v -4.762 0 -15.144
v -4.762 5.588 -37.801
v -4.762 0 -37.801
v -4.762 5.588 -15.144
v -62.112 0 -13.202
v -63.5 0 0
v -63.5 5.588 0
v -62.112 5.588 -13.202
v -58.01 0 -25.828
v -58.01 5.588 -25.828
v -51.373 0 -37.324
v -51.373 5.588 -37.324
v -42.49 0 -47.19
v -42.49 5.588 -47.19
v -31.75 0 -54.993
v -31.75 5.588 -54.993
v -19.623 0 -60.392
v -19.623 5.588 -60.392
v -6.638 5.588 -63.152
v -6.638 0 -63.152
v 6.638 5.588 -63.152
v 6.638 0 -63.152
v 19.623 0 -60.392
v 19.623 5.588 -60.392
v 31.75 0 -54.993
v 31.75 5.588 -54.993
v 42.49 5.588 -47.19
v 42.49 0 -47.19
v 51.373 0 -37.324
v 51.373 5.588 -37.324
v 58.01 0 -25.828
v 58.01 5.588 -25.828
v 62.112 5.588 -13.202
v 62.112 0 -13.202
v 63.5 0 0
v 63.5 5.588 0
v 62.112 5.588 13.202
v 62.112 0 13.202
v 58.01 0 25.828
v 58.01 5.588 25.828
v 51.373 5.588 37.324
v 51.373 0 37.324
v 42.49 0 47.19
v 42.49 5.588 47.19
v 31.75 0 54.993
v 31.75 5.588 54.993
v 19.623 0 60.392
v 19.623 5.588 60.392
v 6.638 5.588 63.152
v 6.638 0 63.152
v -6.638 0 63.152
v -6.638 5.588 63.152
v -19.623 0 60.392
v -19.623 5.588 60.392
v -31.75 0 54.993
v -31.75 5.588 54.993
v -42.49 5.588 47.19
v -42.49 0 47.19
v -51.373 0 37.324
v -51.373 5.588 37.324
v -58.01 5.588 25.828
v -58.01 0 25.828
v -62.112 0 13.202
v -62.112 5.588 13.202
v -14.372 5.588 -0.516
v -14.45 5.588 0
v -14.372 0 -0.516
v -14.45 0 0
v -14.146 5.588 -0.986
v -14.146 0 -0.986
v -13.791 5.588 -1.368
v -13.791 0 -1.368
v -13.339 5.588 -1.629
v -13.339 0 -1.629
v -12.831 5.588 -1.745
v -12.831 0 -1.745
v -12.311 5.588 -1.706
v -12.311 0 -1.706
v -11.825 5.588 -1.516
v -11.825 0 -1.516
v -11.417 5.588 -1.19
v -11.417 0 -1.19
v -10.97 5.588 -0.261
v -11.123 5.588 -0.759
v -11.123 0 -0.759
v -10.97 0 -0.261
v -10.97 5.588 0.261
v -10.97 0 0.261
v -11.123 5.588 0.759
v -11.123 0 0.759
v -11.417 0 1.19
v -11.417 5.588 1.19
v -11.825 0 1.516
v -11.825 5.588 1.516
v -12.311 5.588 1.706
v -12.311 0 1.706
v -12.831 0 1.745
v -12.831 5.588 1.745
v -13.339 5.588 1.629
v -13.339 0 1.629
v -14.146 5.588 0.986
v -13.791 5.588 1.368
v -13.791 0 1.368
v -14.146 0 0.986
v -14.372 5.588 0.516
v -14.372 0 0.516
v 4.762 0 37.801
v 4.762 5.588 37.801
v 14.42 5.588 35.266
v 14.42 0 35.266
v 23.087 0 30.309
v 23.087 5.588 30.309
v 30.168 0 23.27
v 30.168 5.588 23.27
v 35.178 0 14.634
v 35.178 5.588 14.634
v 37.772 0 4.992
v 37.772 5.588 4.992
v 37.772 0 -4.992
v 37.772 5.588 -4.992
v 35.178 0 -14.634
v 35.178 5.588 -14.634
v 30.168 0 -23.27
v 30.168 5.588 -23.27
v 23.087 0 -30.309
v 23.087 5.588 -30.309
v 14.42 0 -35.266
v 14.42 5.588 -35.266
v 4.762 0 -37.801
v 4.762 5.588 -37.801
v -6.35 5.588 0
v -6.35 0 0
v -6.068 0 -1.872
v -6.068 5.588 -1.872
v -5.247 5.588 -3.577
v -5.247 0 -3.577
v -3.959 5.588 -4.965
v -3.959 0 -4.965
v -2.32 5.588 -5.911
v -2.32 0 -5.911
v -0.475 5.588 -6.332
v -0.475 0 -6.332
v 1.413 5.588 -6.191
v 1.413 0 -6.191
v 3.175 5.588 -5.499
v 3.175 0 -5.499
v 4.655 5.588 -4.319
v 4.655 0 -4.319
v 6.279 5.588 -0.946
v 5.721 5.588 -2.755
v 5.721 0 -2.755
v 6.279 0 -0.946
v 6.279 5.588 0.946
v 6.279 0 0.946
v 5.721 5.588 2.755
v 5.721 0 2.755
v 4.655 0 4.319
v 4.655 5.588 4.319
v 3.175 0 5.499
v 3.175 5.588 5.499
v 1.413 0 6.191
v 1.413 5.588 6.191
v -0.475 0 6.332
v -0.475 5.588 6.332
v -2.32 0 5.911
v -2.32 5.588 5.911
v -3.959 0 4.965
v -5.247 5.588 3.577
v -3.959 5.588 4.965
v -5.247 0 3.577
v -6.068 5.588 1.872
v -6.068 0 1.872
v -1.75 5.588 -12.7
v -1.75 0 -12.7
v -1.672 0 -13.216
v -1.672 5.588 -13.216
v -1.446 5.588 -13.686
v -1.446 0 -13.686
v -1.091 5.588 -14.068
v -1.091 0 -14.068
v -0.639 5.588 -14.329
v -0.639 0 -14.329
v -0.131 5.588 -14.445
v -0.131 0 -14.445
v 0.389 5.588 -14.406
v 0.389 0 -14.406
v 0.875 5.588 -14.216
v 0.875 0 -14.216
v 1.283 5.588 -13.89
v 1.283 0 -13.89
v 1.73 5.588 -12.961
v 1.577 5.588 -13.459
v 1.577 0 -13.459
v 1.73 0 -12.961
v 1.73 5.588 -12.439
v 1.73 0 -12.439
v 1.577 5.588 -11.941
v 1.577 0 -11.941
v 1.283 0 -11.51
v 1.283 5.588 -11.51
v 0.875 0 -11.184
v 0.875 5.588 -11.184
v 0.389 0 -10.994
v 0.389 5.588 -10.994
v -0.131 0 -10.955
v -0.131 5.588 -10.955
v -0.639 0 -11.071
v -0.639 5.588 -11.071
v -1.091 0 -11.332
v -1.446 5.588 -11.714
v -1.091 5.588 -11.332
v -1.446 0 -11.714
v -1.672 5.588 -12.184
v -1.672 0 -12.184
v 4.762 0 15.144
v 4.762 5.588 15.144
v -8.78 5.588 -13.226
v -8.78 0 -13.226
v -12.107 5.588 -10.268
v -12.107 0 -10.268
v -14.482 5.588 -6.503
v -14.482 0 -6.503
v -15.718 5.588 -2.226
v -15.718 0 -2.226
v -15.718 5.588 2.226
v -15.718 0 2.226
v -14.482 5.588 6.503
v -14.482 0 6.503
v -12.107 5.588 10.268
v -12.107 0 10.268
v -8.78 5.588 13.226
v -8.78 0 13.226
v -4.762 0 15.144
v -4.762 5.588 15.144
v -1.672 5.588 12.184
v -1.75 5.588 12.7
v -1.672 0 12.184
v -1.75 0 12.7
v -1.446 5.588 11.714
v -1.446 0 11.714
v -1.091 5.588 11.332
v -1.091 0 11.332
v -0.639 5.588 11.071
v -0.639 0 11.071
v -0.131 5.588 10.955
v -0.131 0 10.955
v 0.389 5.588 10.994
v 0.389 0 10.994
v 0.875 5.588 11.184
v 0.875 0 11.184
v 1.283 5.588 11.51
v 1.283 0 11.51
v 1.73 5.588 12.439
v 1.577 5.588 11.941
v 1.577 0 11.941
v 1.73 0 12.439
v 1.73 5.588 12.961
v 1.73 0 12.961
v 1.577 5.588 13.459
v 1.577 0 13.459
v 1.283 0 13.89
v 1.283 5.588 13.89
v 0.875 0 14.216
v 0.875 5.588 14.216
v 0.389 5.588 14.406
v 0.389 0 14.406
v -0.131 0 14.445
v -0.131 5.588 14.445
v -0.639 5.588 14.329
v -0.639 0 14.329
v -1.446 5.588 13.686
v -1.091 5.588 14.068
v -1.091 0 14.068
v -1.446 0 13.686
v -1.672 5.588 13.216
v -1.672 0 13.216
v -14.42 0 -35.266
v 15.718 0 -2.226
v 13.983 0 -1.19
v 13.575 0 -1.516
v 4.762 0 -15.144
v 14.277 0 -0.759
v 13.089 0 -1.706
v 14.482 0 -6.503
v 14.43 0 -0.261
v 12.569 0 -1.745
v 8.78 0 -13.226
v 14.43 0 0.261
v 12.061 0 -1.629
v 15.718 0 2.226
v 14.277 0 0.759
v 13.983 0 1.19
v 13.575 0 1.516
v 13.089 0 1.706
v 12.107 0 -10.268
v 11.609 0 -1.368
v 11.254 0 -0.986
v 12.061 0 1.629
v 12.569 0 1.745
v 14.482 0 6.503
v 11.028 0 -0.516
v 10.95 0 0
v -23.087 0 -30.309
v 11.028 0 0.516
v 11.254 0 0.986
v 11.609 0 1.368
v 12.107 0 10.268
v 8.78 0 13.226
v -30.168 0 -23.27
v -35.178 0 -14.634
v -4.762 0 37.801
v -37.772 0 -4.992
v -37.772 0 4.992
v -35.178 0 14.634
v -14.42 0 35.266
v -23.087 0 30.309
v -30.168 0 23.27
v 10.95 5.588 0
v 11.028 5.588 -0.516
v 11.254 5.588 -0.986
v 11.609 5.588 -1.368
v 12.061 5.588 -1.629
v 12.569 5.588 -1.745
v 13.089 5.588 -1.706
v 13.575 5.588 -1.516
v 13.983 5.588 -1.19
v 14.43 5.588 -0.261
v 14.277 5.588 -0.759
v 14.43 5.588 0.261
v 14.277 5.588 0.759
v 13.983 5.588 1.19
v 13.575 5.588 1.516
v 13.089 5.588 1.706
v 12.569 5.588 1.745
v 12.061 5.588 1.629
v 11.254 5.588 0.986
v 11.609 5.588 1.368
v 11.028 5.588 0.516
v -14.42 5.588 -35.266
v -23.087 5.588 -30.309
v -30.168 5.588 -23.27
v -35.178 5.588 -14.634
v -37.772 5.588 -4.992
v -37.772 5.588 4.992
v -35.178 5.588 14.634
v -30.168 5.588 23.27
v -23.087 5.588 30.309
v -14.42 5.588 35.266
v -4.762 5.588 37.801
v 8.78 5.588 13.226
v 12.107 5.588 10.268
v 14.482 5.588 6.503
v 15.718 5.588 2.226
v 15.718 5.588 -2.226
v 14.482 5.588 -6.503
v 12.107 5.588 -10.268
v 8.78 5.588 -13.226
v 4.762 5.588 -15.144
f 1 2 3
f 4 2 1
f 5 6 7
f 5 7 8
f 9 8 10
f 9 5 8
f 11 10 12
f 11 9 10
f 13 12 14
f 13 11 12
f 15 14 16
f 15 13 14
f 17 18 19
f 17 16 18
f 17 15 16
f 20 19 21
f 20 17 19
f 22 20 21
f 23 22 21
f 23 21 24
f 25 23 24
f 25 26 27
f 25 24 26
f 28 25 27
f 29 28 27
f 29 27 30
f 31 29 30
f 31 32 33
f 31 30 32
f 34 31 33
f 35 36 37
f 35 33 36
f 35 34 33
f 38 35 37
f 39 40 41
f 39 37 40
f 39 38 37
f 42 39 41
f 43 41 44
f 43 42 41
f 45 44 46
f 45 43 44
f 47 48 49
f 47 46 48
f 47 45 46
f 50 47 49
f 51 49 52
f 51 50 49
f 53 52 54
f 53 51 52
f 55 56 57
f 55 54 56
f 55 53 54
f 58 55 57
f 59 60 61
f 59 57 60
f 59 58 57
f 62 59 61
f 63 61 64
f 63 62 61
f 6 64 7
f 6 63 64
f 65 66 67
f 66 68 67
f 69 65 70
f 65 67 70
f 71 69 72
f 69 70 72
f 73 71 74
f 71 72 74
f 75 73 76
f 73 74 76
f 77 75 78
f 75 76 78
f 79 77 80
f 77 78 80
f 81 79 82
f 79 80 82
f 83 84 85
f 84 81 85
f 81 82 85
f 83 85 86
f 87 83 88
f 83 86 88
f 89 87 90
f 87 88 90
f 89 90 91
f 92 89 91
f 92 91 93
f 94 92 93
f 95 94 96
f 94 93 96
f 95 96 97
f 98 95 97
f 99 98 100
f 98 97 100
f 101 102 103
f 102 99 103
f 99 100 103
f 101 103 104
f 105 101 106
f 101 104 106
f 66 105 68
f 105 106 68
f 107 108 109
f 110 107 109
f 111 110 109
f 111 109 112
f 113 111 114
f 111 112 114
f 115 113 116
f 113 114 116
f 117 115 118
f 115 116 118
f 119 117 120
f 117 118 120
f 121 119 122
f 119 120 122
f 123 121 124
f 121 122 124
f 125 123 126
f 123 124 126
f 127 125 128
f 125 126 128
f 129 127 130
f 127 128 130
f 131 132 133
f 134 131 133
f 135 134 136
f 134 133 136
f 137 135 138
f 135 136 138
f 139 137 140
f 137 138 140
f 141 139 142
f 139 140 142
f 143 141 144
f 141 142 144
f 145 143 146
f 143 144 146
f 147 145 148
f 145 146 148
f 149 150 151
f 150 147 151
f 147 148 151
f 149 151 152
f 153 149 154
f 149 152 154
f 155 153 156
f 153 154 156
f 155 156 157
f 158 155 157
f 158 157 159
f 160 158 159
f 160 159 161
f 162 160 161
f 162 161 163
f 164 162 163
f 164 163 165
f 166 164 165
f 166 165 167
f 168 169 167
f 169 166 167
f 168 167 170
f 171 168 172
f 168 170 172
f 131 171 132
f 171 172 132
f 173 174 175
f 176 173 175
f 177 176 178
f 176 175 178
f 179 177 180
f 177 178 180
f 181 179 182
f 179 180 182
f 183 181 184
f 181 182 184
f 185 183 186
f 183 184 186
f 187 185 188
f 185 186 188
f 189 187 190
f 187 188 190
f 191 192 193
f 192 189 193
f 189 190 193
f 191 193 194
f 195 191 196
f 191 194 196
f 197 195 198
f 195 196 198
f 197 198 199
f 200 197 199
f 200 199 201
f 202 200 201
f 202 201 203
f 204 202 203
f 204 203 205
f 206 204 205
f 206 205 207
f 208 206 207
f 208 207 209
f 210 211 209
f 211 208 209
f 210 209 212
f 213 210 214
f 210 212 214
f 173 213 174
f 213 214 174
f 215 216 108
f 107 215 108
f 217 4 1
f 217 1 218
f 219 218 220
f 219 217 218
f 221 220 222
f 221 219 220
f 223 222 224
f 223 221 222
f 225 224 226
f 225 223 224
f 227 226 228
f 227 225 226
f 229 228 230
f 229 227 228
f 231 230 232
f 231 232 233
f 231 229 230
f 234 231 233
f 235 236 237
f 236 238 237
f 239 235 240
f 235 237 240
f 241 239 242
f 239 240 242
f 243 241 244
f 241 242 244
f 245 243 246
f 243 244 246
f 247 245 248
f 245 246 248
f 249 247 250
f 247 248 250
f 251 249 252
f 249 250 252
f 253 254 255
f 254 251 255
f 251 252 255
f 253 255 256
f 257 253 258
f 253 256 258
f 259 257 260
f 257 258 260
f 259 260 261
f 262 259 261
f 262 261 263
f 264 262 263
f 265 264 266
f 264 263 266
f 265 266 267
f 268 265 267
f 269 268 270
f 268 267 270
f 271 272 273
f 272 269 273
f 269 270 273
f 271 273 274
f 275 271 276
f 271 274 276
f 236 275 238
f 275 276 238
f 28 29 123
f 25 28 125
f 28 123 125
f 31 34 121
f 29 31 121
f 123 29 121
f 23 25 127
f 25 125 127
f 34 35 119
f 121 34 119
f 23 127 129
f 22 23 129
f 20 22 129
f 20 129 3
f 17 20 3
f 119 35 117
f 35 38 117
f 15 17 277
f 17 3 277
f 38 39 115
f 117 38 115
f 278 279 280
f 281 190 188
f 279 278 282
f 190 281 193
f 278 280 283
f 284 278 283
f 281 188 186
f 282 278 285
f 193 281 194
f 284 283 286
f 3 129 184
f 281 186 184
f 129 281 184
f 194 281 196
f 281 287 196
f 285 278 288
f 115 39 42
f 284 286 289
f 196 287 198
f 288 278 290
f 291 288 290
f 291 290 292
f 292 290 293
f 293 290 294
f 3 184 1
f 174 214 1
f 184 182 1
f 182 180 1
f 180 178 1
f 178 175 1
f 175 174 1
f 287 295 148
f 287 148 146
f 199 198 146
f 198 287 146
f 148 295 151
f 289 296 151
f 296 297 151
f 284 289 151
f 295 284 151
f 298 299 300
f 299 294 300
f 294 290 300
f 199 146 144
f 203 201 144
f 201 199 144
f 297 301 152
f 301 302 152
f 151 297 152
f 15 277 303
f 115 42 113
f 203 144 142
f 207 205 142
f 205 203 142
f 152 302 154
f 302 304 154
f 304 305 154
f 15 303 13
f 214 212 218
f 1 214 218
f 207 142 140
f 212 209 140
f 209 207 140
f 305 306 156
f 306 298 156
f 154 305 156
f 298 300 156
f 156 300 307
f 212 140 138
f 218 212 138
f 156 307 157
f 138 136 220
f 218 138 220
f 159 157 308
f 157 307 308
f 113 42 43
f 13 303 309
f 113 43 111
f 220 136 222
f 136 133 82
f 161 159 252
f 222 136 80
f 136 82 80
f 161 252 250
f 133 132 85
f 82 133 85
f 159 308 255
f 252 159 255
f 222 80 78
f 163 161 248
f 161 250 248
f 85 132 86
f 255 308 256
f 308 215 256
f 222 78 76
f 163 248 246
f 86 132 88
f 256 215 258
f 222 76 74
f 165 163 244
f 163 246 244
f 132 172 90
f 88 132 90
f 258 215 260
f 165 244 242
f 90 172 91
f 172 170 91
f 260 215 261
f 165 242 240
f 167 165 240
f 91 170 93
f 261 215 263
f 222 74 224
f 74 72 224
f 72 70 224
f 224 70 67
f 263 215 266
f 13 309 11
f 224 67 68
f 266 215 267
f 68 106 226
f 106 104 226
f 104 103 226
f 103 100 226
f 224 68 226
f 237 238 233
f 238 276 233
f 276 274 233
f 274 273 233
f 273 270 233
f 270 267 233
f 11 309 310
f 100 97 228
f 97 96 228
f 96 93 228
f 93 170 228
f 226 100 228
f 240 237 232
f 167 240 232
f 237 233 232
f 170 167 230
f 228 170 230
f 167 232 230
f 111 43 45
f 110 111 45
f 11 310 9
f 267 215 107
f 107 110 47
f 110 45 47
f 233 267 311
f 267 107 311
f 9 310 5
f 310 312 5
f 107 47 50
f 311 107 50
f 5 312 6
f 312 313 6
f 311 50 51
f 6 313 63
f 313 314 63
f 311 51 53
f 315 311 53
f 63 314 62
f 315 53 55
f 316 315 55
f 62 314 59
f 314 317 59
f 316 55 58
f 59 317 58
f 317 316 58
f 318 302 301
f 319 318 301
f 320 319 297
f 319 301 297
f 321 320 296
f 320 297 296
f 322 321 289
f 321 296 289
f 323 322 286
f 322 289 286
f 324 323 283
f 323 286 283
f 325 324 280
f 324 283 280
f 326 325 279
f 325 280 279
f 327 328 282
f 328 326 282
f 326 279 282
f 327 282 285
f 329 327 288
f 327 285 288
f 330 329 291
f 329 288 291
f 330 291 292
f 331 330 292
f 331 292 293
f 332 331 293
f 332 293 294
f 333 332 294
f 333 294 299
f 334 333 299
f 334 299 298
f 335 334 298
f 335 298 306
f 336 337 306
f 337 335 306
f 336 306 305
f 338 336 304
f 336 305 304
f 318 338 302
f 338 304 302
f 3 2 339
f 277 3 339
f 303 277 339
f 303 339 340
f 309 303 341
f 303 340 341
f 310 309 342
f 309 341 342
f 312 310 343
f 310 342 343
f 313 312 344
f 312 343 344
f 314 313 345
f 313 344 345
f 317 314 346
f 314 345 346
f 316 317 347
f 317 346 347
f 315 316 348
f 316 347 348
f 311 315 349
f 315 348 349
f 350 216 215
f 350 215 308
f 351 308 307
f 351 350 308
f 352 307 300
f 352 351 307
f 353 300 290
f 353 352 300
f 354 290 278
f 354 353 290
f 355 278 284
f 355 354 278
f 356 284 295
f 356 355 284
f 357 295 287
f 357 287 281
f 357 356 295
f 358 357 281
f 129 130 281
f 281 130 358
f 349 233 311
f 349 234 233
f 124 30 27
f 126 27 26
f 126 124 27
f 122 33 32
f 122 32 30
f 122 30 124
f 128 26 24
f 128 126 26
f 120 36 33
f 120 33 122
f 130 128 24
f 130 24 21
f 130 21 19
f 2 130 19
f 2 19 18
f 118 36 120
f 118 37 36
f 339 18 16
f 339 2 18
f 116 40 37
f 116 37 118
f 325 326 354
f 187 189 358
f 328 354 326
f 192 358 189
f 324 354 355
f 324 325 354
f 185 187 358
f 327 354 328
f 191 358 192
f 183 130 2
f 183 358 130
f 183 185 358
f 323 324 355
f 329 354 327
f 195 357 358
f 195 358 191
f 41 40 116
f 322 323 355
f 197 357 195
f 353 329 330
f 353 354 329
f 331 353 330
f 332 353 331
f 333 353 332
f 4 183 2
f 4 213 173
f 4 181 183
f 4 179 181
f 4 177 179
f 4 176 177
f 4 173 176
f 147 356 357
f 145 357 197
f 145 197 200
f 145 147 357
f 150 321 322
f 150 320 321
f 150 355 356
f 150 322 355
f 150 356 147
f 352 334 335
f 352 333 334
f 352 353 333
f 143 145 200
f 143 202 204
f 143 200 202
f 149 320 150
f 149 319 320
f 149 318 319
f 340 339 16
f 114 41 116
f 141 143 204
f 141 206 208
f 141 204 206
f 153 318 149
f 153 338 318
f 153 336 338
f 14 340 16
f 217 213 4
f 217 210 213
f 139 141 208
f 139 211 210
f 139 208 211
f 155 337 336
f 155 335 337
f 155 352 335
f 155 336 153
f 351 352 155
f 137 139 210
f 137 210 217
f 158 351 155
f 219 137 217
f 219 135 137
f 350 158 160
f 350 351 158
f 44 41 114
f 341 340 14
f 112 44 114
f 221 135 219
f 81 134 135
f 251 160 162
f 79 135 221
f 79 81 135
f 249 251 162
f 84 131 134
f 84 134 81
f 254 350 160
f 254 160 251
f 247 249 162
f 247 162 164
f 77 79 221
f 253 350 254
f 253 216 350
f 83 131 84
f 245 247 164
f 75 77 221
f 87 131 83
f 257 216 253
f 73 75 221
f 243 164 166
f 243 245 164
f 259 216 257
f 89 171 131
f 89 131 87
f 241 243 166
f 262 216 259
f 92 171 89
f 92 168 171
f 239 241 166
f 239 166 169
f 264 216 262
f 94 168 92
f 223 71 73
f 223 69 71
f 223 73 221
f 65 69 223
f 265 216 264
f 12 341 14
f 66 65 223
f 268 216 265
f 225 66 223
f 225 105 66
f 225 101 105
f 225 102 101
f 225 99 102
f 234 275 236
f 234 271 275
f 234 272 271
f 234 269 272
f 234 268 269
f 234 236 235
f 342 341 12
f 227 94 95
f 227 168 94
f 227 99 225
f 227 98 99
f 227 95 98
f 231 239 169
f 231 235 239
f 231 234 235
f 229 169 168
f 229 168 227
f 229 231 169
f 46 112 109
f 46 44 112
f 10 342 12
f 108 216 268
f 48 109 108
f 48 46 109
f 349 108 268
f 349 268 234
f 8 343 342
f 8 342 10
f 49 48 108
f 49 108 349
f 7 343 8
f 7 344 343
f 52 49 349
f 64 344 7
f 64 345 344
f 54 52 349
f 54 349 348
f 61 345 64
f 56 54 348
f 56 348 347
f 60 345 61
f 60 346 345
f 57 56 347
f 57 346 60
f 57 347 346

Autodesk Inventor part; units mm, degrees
ref_plane "YZ Plane" through (0, 0, 0) normal (1, 0, 0) x (0, 1, 0)
ref_plane "XZ Plane" through (0, 0, 0) normal (0, 1, 0) x (-1, 0, 0)
ref_plane "XY Plane" through (0, 0, 0) normal (0, 0, 1) x (1, 0, 0)
sketch "Sketch1" plane through (0, 0, 0) normal (0, 1, 0) x (-1, 0, 0)
  circle A0 centre (0, 0) radius 63.5
  circle A1 centre (0, 0) radius 6.35
  circle A2 centre (-12.7, 0) radius 1.75
  circle A3 centre (0, -12.7) radius 1.75
  circle A4 centre (12.7, 0) radius 1.75
  circle A5 centre (0, 12.7) radius 1.75
  dimension "d8" = 3.5
  dimension "d9" = 3.5
  dimension "d10" = 3.5
  dimension "d11" = 3.5
extrude "Extrusion1" add sketch "Sketch1" along normal blind 5.588
sketch "Sketch2" plane through (0, 5.588, 0) normal (0, 1, 0) x (1, 0, 0)
  circle A0 centre (0, 0) radius 63.5 projected
  line L0 (-4.7625, 37.8012) -> (-4.7625, 15.1438)
  line L1 (-4.7625, -15.1438) -> (-4.7625, -37.8012)
  line L2 (4.7625, 37.8012) -> (4.7625, 15.1438)
  line L3 (4.7625, -15.1438) -> (4.7625, -37.8012)
  arc A1 (-4.7625, 37.8012) -> (-4.7625, -37.8012) centre (0, 0) ccw
  arc A2 (4.7625, -37.8012) -> (4.7625, 37.8012) centre (0, 0) ccw
  arc A3 (-4.7625, 15.1438) -> (-4.7625, -15.1438) centre (0, 0) ccw
  arc A4 (4.7625, -15.1438) -> (4.7625, 15.1438) centre (0, 0) ccw
extrude "Extrusion2" cut sketch "Sketch2" against normal blind 25.4 contours L0 A3 L1 A1 | A2 L3 A4 L2
properties part number "AcrylicFlywheel2"
